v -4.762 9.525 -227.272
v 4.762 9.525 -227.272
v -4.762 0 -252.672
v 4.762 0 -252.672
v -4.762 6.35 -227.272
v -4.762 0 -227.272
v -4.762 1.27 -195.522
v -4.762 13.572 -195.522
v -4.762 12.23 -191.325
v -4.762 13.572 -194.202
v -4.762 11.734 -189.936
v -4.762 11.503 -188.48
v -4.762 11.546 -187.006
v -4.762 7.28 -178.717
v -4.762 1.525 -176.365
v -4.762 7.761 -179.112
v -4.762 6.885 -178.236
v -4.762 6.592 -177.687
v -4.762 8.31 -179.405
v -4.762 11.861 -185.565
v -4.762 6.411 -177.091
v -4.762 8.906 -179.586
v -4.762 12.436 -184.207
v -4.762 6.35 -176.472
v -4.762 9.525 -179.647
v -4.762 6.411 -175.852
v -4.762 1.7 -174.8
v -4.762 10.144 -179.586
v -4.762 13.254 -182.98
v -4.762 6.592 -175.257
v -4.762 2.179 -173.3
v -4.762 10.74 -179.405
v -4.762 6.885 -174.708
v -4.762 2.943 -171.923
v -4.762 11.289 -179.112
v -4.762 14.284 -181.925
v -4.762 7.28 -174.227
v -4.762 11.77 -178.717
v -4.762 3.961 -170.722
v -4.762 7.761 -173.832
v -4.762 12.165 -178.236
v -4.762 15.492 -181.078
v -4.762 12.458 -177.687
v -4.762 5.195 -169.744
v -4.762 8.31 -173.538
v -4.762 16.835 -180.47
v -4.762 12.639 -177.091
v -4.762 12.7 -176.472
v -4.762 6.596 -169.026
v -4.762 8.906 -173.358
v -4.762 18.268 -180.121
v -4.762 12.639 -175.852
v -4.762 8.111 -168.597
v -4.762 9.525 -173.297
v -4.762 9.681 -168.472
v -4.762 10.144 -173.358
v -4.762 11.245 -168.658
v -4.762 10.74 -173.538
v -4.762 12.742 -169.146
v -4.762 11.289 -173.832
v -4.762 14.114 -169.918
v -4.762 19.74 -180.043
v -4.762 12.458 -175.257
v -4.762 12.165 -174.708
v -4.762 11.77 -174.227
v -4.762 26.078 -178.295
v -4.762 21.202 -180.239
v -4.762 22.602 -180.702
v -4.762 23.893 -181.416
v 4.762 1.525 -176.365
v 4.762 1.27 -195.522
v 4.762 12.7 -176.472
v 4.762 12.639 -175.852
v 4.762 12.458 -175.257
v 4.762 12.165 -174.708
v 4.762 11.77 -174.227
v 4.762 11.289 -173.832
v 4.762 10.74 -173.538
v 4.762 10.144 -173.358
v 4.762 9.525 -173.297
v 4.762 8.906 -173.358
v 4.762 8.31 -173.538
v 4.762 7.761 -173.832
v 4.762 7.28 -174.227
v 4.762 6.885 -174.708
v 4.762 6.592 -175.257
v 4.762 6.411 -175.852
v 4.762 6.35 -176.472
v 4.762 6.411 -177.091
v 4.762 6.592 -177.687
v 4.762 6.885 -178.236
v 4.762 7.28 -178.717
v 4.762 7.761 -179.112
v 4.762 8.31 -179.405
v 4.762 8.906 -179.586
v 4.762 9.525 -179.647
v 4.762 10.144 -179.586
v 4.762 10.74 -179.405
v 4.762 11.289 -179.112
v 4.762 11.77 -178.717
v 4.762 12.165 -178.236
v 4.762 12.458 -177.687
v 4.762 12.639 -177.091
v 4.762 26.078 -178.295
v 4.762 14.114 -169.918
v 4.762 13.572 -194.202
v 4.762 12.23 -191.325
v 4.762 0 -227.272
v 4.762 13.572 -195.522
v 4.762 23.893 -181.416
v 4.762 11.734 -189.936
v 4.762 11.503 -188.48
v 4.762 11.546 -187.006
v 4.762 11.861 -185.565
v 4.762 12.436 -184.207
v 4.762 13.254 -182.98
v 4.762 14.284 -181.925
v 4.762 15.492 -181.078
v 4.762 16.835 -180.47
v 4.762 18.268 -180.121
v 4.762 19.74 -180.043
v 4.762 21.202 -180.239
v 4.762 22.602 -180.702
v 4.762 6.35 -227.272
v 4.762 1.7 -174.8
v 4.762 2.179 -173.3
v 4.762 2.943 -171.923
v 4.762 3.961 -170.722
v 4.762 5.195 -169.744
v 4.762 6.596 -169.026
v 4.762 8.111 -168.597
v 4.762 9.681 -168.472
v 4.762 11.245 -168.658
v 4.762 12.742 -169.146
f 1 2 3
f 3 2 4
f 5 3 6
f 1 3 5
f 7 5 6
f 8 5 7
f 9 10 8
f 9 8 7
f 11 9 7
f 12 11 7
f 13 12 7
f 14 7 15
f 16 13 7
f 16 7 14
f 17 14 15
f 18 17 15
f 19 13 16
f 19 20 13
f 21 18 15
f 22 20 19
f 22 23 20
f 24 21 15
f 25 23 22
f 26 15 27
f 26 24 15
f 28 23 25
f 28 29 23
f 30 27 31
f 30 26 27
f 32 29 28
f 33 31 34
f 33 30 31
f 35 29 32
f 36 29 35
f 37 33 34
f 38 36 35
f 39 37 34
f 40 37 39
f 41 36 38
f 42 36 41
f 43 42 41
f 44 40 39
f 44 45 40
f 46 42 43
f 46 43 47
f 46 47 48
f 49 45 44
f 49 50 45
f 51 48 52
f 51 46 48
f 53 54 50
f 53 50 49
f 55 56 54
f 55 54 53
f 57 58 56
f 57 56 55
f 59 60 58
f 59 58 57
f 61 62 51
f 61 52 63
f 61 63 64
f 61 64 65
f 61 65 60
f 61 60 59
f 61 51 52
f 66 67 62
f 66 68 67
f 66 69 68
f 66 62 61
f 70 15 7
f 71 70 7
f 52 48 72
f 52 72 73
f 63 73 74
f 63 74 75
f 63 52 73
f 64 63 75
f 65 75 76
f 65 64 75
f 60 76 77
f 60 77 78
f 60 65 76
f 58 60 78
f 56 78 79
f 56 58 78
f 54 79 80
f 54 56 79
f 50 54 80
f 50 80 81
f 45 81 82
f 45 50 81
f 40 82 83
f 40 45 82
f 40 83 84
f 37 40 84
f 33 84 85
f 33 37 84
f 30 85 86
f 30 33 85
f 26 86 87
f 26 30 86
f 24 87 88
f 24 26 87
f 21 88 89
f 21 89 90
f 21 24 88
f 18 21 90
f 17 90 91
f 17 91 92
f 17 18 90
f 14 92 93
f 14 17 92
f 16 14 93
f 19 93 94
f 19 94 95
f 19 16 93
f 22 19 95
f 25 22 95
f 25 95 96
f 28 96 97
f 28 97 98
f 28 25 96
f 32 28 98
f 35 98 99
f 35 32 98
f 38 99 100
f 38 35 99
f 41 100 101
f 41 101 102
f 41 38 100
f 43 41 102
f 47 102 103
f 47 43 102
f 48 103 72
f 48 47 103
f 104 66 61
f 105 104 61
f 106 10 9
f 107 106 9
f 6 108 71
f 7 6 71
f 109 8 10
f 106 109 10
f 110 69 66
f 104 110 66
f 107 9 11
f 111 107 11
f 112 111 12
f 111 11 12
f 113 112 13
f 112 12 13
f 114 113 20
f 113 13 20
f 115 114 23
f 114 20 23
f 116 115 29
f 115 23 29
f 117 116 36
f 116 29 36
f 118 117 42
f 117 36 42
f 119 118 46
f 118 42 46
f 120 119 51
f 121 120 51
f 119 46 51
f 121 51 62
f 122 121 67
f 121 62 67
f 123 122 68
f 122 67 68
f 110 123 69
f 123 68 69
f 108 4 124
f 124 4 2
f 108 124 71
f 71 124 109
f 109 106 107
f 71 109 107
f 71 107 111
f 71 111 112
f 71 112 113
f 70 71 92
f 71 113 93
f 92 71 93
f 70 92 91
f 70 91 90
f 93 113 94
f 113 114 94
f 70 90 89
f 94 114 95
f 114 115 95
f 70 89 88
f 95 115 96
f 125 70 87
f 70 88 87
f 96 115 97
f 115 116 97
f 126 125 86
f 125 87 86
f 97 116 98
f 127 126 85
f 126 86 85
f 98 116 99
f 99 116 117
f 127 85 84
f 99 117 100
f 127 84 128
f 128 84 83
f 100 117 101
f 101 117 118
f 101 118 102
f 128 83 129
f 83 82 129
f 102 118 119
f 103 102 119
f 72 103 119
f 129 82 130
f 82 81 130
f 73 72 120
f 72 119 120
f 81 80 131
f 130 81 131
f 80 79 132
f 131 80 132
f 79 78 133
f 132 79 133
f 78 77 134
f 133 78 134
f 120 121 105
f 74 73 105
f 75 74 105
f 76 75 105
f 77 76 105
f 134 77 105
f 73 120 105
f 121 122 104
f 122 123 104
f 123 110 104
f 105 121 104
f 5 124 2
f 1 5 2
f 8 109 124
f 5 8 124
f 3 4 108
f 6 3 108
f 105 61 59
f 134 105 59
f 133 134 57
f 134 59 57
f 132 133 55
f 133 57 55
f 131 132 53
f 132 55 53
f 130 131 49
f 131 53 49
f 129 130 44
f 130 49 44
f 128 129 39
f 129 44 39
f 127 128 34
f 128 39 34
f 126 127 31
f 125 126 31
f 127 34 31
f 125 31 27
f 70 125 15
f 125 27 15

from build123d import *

# Parameters (mm, degrees)
STOCK_HAMMERSAW_START                 = -4.7625
STOCK_HAMMERSAW_MULTIBODY_1_OUTLINE_R = 3.175
STOCK_HAMMERSAW_MULTIBODY_1_DEPTH     = 9.525
BOSS_EXTRUDE3_DEPTH                   = 9.525


# Read off the part's stored shape, not the designer's step: Stock-HammerSaw Multibody-1
with BuildPart() as part:
    # Stock-HammerSaw Multibody-1 outline → Stock-HammerSaw Multibody-1 (new body)
    with BuildSketch(Plane.YZ.offset(STOCK_HAMMERSAW_START)):
        with BuildLine():
            ThreePointArc((14.114185067, -169.917610968), (5.877809274, -169.350270146), (1.524707151, -176.365272906))
            Line((1.524707151, -176.365272906), (1.27, -195.521646474))
            Line((1.27, -195.521646474), (13.572128535, -195.521646474))
            Line((13.572128535, -195.521646474), (13.572128535, -194.202498844))
            Line((13.572128535, -194.202498844), (12.230315554, -191.32497162))
            ThreePointArc((12.230315554, -191.32497162), (14.283881996, -181.92450591), (23.892574452, -181.415664109))
            Line((23.892574452, -181.415664109), (26.077900674, -178.294694821))
            Line((26.077900674, -178.294694821), (14.114185067, -169.917610968))
        make_face()
        with Locations((9.525, -176.471646474)):
            Circle(STOCK_HAMMERSAW_MULTIBODY_1_OUTLINE_R, mode=Mode.SUBTRACT)
    extrude(amount=STOCK_HAMMERSAW_MULTIBODY_1_DEPTH)

    # Sketch3 → Boss-Extrude3 (add)
    with BuildSketch(Plane(origin=(4.7625, 0, 0), x_dir=(0, 0, -1), z_dir=(1, 0, 0))):
        Polygon((195.521646474, 13.572128535), (227.271646474, 6.35), (227.271646474, 9.525), (252.671646474, 0), (227.271646474, 0), (195.521646474, 1.27), align=None)
    extrude(amount=-BOSS_EXTRUDE3_DEPTH)


solid = part.part
